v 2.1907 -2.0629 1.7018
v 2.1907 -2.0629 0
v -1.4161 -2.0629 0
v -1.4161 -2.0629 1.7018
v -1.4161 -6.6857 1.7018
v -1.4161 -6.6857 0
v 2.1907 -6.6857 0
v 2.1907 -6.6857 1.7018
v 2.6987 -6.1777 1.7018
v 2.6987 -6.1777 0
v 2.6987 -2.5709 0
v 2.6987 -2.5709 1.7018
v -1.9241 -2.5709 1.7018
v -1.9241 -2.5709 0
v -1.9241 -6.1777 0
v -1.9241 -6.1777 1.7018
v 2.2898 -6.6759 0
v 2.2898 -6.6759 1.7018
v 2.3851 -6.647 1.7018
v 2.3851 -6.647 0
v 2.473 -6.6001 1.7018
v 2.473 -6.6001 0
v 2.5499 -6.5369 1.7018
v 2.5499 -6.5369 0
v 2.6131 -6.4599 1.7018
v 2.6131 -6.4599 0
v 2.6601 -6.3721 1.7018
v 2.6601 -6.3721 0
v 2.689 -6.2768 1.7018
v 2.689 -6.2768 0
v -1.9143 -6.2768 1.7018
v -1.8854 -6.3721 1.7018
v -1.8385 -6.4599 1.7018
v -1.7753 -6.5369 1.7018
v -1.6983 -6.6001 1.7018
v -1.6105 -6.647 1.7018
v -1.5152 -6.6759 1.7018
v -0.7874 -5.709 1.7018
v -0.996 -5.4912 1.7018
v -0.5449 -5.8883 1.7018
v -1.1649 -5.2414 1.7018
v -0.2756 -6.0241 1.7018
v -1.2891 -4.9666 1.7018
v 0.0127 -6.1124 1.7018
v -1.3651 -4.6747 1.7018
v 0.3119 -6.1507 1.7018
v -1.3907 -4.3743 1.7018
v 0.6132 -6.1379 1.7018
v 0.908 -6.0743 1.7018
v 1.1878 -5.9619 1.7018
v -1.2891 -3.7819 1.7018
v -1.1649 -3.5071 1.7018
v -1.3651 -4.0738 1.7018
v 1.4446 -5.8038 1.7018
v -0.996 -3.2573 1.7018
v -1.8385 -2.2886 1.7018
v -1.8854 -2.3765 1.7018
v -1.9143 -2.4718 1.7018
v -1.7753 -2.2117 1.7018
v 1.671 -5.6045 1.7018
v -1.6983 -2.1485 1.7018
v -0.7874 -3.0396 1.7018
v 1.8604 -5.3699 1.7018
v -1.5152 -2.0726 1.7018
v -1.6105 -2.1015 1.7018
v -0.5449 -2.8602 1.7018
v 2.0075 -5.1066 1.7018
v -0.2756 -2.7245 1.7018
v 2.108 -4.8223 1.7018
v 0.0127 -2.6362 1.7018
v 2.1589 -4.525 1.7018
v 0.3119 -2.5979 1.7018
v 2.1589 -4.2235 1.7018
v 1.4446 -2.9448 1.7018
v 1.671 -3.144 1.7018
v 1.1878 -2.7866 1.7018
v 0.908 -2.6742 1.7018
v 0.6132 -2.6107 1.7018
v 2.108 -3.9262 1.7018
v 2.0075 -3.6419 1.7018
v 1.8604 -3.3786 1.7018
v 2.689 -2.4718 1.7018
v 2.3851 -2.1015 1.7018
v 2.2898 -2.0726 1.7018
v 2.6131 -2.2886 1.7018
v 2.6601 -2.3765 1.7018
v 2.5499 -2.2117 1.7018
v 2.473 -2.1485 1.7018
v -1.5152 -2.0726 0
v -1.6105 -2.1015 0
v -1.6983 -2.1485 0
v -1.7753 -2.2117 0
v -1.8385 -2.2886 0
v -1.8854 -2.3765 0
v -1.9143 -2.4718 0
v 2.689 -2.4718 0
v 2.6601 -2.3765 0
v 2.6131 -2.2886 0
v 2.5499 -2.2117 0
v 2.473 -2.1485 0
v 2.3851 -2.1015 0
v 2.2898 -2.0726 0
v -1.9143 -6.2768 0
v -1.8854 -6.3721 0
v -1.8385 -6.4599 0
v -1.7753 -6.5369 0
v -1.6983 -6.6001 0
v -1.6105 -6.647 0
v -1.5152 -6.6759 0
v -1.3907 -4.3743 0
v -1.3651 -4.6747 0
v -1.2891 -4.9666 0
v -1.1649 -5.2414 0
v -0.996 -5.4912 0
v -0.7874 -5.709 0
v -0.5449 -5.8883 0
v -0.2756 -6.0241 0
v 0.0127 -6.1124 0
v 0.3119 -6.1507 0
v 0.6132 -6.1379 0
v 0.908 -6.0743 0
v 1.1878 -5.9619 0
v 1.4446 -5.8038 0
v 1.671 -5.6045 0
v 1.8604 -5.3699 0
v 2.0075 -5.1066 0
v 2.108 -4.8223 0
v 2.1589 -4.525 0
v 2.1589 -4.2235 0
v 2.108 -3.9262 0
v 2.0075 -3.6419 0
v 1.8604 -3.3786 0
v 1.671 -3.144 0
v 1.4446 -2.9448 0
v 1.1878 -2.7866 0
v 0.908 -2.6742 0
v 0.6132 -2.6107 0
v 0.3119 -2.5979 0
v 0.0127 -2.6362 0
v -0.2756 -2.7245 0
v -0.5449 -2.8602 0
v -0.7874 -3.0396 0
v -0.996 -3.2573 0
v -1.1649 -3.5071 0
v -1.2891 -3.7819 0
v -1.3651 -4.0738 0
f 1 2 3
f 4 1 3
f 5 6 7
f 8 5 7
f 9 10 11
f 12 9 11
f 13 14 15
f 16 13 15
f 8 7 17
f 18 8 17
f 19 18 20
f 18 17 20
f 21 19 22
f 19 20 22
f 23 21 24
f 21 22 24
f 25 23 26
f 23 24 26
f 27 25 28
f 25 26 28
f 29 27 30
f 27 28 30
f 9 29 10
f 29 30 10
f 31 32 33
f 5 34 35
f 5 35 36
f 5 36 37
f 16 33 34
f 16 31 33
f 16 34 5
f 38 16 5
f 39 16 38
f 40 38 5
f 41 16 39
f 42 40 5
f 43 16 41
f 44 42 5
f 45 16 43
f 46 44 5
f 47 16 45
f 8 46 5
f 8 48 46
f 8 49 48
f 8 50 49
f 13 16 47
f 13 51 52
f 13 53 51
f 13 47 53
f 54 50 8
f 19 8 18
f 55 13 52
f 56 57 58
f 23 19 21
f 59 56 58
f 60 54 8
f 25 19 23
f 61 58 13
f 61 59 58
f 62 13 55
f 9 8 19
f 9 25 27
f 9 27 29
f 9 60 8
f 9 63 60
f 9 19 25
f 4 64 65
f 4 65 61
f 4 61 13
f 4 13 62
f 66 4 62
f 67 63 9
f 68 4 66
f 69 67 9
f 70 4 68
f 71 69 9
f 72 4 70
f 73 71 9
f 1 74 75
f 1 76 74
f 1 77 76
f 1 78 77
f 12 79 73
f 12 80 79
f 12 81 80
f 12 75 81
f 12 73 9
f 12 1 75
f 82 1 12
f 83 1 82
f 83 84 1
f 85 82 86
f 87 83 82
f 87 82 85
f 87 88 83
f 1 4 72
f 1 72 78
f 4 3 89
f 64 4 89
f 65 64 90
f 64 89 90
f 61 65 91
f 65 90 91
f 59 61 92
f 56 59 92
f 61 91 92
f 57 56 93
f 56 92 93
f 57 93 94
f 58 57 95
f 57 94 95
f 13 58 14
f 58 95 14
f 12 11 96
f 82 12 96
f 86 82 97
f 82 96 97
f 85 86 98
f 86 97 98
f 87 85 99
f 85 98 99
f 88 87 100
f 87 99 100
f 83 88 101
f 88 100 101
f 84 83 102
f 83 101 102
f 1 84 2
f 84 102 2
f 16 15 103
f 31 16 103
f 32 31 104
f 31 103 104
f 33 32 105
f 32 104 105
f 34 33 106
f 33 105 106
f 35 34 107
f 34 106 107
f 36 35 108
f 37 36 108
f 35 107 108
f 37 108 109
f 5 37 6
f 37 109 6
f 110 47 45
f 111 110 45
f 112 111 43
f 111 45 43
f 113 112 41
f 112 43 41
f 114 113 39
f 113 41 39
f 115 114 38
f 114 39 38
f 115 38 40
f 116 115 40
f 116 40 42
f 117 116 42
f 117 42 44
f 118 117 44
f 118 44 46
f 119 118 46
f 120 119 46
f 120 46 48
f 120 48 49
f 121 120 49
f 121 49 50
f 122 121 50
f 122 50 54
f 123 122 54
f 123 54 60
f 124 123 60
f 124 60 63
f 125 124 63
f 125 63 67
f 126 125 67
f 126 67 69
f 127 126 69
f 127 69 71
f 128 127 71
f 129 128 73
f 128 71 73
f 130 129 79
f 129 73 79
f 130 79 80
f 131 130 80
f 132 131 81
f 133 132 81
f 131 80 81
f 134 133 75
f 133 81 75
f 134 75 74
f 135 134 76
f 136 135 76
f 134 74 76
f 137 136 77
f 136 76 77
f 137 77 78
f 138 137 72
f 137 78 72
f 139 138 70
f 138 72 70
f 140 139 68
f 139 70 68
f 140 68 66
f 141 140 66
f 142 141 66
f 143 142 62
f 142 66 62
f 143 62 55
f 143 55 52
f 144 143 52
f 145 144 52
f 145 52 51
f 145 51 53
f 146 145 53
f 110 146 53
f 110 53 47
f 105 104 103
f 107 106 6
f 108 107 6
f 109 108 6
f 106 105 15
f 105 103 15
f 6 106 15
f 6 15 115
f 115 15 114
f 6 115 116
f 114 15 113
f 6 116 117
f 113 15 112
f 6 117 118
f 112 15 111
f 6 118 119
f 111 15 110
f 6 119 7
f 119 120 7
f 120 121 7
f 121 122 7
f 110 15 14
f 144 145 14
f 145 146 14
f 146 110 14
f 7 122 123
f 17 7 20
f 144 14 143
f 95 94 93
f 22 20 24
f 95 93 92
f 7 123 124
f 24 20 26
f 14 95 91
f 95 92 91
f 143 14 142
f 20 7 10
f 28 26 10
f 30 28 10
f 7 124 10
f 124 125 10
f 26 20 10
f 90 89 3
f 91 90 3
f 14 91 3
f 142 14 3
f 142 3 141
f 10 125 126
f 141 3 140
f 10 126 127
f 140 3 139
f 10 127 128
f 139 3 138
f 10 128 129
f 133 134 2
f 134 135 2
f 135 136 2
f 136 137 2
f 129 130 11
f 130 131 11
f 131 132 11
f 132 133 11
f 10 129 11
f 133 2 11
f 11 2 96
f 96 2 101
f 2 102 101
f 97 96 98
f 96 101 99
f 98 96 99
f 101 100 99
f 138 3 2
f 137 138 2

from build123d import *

# Parameters (mm, degrees)
F1_DEPTH = 1.7018
F3_D     = 3.556


# Not quite as in the source:
# - a feature names something its author has since deleted; it is built from what else it names


with BuildPart() as f1:
    # F0 (on Top) → F1 (new body)
    with BuildSketch(Plane.XY):
        with BuildLine():
            Line((2.1907232318, -2.0628636251), (-1.4160767682, -2.0628636251))
            ThreePointArc((-1.4160767682, -2.0628636251), (-1.775287013, -2.2116533802), (-1.9240767682, -2.5708636251))
            Line((-1.9240767682, -2.5708636251), (-1.9240767682, -6.1776636251))
            ThreePointArc((-1.9240767682, -6.1776636251), (-1.775287013, -6.5368738699), (-1.4160767682, -6.6856636251))
            Line((-1.4160767682, -6.6856636251), (2.1907232318, -6.6856636251))
            ThreePointArc((2.1907232318, -6.6856636251), (2.5499334767, -6.5368738699), (2.6987232318, -6.1776636251))
            Line((2.6987232318, -6.1776636251), (2.6987232318, -2.5708636251))
            ThreePointArc((2.6987232318, -2.5708636251), (2.5499334767, -2.2116533802), (2.1907232318, -2.0628636251))
        make_face()
    extrude(amount=F1_DEPTH)

    # F3 (through all)
    with Locations(Plane(origin=(0, 0, 0), x_dir=(1, 0, 0), z_dir=(0, 0, -1))):
        with Locations((0.3873232318, 4.3742636251)):
            Hole(F3_D / 2)


solid = f1.part
